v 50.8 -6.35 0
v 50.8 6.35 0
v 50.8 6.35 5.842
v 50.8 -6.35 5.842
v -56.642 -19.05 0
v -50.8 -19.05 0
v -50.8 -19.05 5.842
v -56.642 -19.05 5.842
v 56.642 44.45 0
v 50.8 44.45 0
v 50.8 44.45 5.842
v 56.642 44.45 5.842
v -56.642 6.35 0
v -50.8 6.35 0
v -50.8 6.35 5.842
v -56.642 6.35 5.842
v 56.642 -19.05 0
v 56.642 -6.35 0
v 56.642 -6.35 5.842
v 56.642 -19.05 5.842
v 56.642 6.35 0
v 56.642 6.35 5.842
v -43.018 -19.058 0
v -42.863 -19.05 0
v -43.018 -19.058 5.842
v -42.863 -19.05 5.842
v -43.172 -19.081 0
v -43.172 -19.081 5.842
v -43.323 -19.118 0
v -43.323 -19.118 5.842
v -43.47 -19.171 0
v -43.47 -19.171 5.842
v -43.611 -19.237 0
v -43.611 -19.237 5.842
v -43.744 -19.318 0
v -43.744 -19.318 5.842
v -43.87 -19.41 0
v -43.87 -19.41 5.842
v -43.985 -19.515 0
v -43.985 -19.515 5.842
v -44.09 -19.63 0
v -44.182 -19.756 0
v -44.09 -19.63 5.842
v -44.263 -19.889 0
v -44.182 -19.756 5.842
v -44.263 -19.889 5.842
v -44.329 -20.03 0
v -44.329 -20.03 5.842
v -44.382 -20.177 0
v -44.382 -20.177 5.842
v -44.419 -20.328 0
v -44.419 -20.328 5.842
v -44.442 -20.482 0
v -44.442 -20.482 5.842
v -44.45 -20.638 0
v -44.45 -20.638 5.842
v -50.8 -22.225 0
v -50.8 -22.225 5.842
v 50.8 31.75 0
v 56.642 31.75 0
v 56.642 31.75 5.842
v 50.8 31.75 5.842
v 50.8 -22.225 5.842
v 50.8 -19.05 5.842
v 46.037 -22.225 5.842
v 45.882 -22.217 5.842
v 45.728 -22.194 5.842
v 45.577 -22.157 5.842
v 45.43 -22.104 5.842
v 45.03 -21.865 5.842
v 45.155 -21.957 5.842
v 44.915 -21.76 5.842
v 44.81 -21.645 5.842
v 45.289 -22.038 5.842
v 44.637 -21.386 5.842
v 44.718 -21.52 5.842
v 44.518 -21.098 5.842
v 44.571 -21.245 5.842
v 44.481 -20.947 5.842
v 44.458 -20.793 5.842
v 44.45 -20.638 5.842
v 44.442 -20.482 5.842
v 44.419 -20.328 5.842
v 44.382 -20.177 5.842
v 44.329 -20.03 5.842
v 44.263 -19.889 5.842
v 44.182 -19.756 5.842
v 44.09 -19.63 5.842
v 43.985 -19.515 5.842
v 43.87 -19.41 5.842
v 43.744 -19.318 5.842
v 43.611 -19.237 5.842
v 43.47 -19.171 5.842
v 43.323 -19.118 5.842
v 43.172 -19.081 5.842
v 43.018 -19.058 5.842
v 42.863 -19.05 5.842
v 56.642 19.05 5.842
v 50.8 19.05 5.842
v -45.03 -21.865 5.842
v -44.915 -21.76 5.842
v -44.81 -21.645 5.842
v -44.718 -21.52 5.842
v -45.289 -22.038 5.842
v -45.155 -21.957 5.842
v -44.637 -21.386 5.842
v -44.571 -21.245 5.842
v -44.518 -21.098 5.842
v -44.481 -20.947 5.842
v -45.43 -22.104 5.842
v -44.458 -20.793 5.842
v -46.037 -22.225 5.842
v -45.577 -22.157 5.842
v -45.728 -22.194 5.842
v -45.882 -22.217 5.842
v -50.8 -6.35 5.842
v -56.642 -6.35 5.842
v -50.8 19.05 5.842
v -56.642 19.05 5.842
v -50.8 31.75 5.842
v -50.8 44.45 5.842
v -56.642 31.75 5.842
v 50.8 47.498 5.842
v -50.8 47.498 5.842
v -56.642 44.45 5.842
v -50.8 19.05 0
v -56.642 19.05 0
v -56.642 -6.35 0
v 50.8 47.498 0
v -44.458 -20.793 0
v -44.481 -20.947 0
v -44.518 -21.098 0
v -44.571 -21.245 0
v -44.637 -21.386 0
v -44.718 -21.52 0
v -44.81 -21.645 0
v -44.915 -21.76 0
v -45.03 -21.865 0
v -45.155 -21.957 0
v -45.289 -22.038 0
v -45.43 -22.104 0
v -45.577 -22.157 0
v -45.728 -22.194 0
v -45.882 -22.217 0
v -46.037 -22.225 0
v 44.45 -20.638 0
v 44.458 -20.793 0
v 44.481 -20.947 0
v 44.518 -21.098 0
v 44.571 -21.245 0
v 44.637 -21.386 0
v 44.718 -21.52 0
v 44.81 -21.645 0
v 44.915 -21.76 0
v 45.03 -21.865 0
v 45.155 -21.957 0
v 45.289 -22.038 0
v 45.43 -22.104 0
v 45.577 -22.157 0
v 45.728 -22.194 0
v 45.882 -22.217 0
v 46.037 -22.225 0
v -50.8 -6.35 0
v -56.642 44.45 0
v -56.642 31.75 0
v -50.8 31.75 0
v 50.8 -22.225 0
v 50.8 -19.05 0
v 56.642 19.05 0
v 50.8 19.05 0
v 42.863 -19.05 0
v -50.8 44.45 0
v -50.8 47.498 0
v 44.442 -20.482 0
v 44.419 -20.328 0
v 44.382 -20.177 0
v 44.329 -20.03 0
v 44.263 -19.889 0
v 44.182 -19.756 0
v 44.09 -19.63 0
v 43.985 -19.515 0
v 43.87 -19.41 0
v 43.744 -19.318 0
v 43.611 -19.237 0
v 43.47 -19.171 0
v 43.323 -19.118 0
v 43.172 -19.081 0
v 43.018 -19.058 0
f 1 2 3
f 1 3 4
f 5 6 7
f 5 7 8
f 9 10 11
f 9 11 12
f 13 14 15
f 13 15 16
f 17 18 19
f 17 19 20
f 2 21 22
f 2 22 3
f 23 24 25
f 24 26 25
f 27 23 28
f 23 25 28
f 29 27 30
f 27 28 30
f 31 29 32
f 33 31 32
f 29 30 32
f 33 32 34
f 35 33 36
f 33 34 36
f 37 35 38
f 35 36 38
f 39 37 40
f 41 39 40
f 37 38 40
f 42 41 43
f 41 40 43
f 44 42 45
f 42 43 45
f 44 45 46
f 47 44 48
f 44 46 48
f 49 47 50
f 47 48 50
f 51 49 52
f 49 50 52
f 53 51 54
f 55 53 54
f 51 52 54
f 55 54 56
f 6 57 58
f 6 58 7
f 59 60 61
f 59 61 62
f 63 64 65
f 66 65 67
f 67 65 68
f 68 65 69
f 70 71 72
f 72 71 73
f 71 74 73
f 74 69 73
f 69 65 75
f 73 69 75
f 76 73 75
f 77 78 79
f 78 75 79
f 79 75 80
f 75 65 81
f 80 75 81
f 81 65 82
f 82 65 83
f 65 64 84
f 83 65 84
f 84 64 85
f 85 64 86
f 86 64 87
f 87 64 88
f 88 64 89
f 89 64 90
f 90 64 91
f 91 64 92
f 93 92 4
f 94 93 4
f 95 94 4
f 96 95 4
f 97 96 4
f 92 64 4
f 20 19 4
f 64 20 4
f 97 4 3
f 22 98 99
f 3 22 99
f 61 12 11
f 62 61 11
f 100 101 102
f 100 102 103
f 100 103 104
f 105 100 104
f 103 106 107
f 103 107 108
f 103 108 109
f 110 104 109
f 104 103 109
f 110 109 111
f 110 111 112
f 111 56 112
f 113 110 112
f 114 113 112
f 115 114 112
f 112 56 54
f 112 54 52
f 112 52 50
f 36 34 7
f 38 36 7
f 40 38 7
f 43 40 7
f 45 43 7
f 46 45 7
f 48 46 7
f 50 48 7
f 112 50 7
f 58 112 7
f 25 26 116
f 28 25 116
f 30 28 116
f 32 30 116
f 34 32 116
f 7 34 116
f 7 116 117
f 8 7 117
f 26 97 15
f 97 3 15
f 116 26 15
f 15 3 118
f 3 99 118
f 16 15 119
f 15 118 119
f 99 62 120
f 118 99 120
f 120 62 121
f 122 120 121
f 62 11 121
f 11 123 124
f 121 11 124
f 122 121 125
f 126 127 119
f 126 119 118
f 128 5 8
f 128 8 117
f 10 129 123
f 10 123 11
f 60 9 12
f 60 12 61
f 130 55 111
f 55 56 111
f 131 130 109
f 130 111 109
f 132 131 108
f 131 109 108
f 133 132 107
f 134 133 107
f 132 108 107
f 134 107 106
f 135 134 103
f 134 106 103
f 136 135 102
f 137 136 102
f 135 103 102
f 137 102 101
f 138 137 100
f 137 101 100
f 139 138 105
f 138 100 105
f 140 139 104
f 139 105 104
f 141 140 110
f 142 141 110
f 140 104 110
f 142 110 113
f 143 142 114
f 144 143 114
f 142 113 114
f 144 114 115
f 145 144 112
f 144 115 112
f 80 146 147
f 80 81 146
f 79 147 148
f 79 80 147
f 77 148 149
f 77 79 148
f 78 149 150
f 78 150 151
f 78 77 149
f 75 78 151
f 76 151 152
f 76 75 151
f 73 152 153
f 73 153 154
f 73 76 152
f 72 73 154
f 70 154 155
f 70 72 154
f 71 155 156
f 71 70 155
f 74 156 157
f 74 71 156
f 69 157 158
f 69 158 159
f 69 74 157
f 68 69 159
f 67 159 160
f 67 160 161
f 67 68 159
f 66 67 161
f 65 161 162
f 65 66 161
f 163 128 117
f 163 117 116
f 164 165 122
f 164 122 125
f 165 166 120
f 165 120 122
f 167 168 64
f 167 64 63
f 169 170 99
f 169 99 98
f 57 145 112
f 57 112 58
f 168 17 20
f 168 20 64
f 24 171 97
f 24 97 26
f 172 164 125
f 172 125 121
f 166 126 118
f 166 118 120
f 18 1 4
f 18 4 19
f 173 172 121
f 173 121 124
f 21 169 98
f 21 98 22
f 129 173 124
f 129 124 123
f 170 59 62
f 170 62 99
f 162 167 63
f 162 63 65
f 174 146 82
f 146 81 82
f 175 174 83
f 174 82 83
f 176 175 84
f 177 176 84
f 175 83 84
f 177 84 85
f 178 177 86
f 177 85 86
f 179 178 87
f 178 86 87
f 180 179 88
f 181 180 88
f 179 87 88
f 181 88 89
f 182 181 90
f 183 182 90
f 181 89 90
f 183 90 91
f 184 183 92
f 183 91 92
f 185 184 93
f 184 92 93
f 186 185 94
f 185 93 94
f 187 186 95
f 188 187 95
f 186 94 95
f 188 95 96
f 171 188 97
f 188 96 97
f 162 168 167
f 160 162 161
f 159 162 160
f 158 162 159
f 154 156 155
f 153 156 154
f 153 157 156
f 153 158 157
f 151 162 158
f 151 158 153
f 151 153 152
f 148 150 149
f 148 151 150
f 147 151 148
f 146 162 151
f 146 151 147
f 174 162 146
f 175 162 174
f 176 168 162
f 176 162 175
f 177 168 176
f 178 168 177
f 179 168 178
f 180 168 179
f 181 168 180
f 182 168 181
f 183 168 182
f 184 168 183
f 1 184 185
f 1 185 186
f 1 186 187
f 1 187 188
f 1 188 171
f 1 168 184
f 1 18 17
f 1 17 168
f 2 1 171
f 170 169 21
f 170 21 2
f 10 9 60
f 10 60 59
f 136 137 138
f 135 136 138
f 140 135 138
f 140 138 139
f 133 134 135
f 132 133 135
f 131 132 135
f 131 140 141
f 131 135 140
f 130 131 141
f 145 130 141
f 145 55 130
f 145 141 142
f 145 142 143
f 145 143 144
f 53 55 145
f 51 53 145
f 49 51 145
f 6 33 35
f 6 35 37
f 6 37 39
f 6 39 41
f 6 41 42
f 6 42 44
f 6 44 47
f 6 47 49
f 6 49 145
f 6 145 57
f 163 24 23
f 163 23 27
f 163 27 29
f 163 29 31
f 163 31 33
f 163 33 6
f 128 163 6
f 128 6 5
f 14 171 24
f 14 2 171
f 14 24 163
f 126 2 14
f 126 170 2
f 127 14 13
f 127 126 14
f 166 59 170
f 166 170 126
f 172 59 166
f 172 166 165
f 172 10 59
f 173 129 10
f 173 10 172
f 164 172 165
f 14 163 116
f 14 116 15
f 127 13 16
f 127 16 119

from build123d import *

# Parameters (mm, degrees)
BOSS_EXTRUDE1_DEPTH = 5.842
FILLET1_R           = 1.5875


with BuildPart() as part:
    # Sketch1 → Boss-Extrude1 (new body)
    with BuildSketch(Plane.XY):
        Polygon((50.8, -22.225), (44.45, -22.225), (44.45, -19.05), (-44.45, -19.05), (-44.45, -22.225), (-50.8, -22.225), (-50.8, -19.05), (-56.642, -19.05), (-56.642, -6.35), (-50.8, -6.35), (-50.8, 6.35), (-56.642, 6.35), (-56.642, 19.05), (-50.8, 19.05), (-50.8, 31.75), (-56.642, 31.75), (-56.642, 44.45), (-50.8, 44.45), (-50.8, 47.498), (50.8, 47.498), (50.8, 44.45), (56.642, 44.45), (56.642, 31.75), (50.8, 31.75), (50.8, 19.05), (56.642, 19.05), (56.642, 6.35), (50.8, 6.35), (50.8, -6.35), (56.642, -6.35), (56.642, -19.05), (50.8, -19.05), align=None)
    extrude(amount=BOSS_EXTRUDE1_DEPTH)

    # Fillet1
    fillet1_edges = [part.edges().sort_by_distance(p)[0] for p in [
        (-44.45, -19.05, 2.921),
        (44.45, -19.05, 2.921),
    ]]
    fillet(fillet1_edges, radius=FILLET1_R)
    fillet1_2_edges = [part.edges().sort_by_distance(p)[0] for p in [
        (44.45, -22.225, 2.921),
        (-44.45, -22.225, 2.921),
    ]]
    fillet(fillet1_2_edges, radius=FILLET1_R - 0.0001)  # a hair under: the kernel refuses the full size


solid = part.part
